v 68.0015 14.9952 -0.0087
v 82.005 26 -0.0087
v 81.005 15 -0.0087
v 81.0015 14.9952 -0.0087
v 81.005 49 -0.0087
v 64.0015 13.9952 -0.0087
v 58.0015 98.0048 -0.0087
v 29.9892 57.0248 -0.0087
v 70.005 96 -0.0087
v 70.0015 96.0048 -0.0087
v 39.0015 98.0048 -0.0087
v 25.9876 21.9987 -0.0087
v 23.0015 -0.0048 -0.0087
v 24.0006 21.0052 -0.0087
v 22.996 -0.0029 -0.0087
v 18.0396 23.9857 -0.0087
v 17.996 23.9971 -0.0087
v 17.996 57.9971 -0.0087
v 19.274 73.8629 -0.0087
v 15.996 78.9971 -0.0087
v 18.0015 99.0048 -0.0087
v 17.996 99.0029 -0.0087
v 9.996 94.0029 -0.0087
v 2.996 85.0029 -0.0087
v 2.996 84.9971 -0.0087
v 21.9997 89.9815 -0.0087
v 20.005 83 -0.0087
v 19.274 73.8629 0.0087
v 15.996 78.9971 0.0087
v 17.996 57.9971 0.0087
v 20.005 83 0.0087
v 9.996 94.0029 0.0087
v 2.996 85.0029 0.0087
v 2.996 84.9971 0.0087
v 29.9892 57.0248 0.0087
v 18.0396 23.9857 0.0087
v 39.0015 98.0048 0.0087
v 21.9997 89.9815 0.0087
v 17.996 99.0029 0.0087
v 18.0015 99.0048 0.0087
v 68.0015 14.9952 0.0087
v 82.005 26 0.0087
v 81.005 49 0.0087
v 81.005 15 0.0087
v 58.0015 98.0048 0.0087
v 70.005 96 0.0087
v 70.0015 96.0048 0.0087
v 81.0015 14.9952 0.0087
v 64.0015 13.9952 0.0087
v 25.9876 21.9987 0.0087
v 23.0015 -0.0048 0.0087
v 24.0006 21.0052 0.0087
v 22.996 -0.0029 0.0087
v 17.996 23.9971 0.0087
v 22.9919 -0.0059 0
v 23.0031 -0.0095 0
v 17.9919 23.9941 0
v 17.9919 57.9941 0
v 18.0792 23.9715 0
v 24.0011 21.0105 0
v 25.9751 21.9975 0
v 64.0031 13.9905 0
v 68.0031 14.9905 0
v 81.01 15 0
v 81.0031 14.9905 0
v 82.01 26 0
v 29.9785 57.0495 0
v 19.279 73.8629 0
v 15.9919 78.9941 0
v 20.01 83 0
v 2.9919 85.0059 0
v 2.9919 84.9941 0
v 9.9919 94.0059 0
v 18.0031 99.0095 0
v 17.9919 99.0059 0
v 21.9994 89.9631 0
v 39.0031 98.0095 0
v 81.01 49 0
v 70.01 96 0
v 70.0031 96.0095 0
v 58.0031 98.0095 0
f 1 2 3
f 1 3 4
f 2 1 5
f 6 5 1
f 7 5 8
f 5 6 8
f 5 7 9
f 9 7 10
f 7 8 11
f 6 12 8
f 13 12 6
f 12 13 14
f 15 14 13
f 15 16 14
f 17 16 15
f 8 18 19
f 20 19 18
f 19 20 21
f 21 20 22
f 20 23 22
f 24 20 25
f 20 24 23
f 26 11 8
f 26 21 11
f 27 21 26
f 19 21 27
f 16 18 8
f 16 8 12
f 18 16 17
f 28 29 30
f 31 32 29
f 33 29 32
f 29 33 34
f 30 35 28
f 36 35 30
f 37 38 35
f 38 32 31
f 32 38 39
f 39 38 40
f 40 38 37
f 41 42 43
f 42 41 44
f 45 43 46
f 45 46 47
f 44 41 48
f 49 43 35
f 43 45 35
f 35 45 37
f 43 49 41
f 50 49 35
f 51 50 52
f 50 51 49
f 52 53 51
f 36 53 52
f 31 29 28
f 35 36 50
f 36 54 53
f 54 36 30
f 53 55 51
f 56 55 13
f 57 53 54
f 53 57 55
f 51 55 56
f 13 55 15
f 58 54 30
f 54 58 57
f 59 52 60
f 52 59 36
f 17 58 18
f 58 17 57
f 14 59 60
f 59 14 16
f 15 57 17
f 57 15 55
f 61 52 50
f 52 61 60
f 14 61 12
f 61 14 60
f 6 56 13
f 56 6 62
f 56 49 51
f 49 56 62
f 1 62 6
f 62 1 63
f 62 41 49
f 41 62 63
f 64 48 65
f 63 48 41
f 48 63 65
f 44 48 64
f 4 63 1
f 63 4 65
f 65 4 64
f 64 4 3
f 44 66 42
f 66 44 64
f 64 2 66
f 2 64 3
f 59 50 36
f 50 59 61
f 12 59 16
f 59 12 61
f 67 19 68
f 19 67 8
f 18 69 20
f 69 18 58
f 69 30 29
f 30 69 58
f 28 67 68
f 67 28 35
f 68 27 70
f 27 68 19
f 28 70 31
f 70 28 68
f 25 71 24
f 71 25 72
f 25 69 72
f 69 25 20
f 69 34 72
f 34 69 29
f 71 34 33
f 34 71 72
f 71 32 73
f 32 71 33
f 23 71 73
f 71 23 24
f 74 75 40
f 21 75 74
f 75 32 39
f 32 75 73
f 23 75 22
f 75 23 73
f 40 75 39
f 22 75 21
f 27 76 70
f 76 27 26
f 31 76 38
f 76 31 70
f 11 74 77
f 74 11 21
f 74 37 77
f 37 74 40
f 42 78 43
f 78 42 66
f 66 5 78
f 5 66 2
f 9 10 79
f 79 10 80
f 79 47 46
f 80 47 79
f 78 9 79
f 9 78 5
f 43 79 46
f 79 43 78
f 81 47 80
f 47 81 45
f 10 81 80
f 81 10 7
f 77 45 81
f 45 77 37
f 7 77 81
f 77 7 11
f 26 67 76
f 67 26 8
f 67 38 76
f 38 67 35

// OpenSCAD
color([0.38512246522478266,0.6162859510128613,0.407224705538046]) hull(){
    translate([42,29]) sphere(0.01);
    translate([44,47]) sphere(0.01);
    translate([35,48]) sphere(0.01);
}
color([0.6107800780239486,0.9541913078580654,0.09369719926319908]) hull(){
    translate([42,29]) sphere(0.01);
    translate([44,47]) sphere(0.01);
    translate([58,33]) sphere(0.01);
}
color([0.4396226851829427,0.9817497074141792,0.30111933510979894]) hull(){
    translate([44,47]) sphere(0.01);
    translate([35,48]) sphere(0.01);
    translate([44,55]) sphere(0.01);
}
color([0.08571041628526821,0.691130580335744,0.16573157374072334]) hull(){
    translate([44,47]) sphere(0.01);
    translate([44,55]) sphere(0.01);
    translate([58,33]) sphere(0.01);
}
color([0.4668304924867862,0.30100213617539295,0.3511677492745029]) hull(){
    translate([23,0]) sphere(0.01);
    translate([18,24]) sphere(0.01);
    translate([24,21]) sphere(0.01);
}
color([0.05564944269037686,0.7696481469448815,0.686275624239137]) hull(){
    translate([23,0]) sphere(0.01);
    translate([24,21]) sphere(0.01);
    translate([26,22]) sphere(0.01);
}
color([0.15447252119296884,0.35335085758162643,0.18799175914388588]) hull(){
    translate([23,0]) sphere(0.01);
    translate([26,22]) sphere(0.01);
    translate([42,29]) sphere(0.01);
}
color([0.41322879780265653,0.82270842281296,0.9057146612667819]) hull(){
    translate([23,0]) sphere(0.01);
    translate([42,29]) sphere(0.01);
    translate([64,14]) sphere(0.01);
}
color([0.9688547633127277,0.5528378273263655,0.12760284187612392]) hull(){
    translate([64,14]) sphere(0.01);
    translate([42,29]) sphere(0.01);
    translate([58,33]) sphere(0.01);
}
color([0.1710979555253146,0.7131998843266452,0.6397779425125977]) hull(){
    translate([64,14]) sphere(0.01);
    translate([58,33]) sphere(0.01);
    translate([68,15]) sphere(0.01);
}
color([0.57496968906483,0.8489371230716904,0.07944838941339594]) hull(){
    translate([68,15]) sphere(0.01);
    translate([58,33]) sphere(0.01);
    translate([72,20]) sphere(0.01);
}
color([0.040333123224873146,0.9305910632054132,0.3080440975445232]) hull(){
    translate([68,15]) sphere(0.01);
    translate([72,20]) sphere(0.01);
    translate([81,15]) sphere(0.01);
}
color([0.6084655882345898,0.4923441190446234,0.7069385087242315]) hull(){
    translate([81,15]) sphere(0.01);
    translate([72,20]) sphere(0.01);
    translate([82,26]) sphere(0.01);
}
color([0.6803385961846494,0.18024793645131376,0.10787678186317007]) hull(){
    translate([18,24]) sphere(0.01);
    translate([26,22]) sphere(0.01);
    translate([26,51]) sphere(0.01);
}
color([0.1335624130282893,0.47731112778056706,0.8393950916733898]) hull(){
    translate([26,22]) sphere(0.01);
    translate([26,51]) sphere(0.01);
    translate([35,48]) sphere(0.01);
}
color([0.6780893207968227,0.08337096158279222,0.27725115680544954]) hull(){
    translate([26,22]) sphere(0.01);
    translate([35,48]) sphere(0.01);
    translate([42,29]) sphere(0.01);
}
color([0.9965791662073833,0.03375154870506614,0.10494976972159242]) hull(){
    translate([26,51]) sphere(0.01);
    translate([35,48]) sphere(0.01);
    translate([30,57]) sphere(0.01);
}
color([0.516844917539197,0.1360610465034362,0.543805910213663]) hull(){
    translate([26,51]) sphere(0.01);
    translate([30,57]) sphere(0.01);
    translate([18,58]) sphere(0.01);
}
color([0.04901628196141694,0.4867102513994055,0.8813892002857401]) hull(){
    translate([18,24]) sphere(0.01);
    translate([26,51]) sphere(0.01);
    translate([18,58]) sphere(0.01);
}
color([0.3053751014353143,0.40772022041766365,0.31297204198076634]) hull(){
    translate([35,48]) sphere(0.01);
    translate([30,57]) sphere(0.01);
    translate([44,55]) sphere(0.01);
}
color([0.49907796034366436,0.6160709555012981,0.9916538905911245]) hull(){
    translate([44,55]) sphere(0.01);
    translate([30,57]) sphere(0.01);
    translate([59,71]) sphere(0.01);
}
color([0.3123575451593331,0.46364206475662195,0.8862899719975306]) hull(){
    translate([30,57]) sphere(0.01);
    translate([18,58]) sphere(0.01);
    translate([16,79]) sphere(0.01);
}
color([0.5738800220993816,0.8494037217359881,0.24323676398212035]) hull(){
    translate([44,55]) sphere(0.01);
    translate([59,71]) sphere(0.01);
    translate([77,50]) sphere(0.01);
}
color([0.8402878098664139,0.9530478541805099,0.16594803365564914]) hull(){
    translate([18,58]) sphere(0.01);
    translate([16,79]) sphere(0.01);
    translate([20,83]) sphere(0.01);
}
color([0.0023370868964924796,0.7387895340607371,0.5374530602666081]) hull(){
    translate([20,83]) sphere(0.01);
    translate([16,79]) sphere(0.01);
    translate([6,84]) sphere(0.01);
}
color([0.25604025835089217,0.4320068924153808,0.5112453323210508]) hull(){
    translate([16,79]) sphere(0.01);
    translate([6,84]) sphere(0.01);
    translate([3,85]) sphere(0.01);
}
color([0.7462272619347637,0.5039790716190428,0.8850839351693509]) hull(){
    translate([20,83]) sphere(0.01);
    translate([6,84]) sphere(0.01);
    translate([10,94]) sphere(0.01);
}
color([0.6652757233710683,0.22263754843686523,0.08942086350367451]) hull(){
    translate([10,94]) sphere(0.01);
    translate([6,84]) sphere(0.01);
    translate([3,85]) sphere(0.01);
}
color([0.6195232841458308,0.9036720387350747,0.7222923954673625]) hull(){
    translate([10,94]) sphere(0.01);
    translate([3,85]) sphere(0.01);
    translate([18,99]) sphere(0.01);
}
color([0.6665075097113882,0.5421139713900744,0.6943978877819516]) hull(){
    translate([20,83]) sphere(0.01);
    translate([10,94]) sphere(0.01);
    translate([22,90]) sphere(0.01);
}
color([0.9269770591996176,0.12480324665016229,0.8422397758241813]) hull(){
    translate([22,90]) sphere(0.01);
    translate([10,94]) sphere(0.01);
    translate([18,99]) sphere(0.01);
}
color([0.028249143050612435,0.8554899328562455,0.6212809598996976]) hull(){
    translate([22,90]) sphere(0.01);
    translate([18,99]) sphere(0.01);
    translate([39,98]) sphere(0.01);
}
color([0.6435486749275994,0.4857227915978113,0.2898251547629681]) hull(){
    translate([22,90]) sphere(0.01);
    translate([39,98]) sphere(0.01);
    translate([50,93]) sphere(0.01);
}
color([0.21709076393122206,0.4979948584580751,0.6176241526046676]) hull(){
    translate([58,33]) sphere(0.01);
    translate([72,20]) sphere(0.01);
    translate([82,26]) sphere(0.01);
}
color([0.4722249532281336,0.7228331534363125,0.6109414561657331]) hull(){
    translate([58,33]) sphere(0.01);
    translate([82,26]) sphere(0.01);
    translate([80,52]) sphere(0.01);
}
color([0.5330085163671737,0.6769359871291822,0.5973748769978083]) hull(){
    translate([82,26]) sphere(0.01);
    translate([80,52]) sphere(0.01);
    translate([81,49]) sphere(0.01);
}
color([0.14460255854654236,0.21273280877313017,0.8417179364881341]) hull(){
    translate([80,52]) sphere(0.01);
    translate([77,50]) sphere(0.01);
    translate([81,49]) sphere(0.01);
}
color([0.6300391880279899,0.5103677782275869,0.4479627161837708]) hull(){
    translate([58,33]) sphere(0.01);
    translate([80,52]) sphere(0.01);
    translate([77,50]) sphere(0.01);
}
color([0.2903518628620462,0.1744676713524972,0.5457372127765215]) hull(){
    translate([44,47]) sphere(0.01);
    translate([58,33]) sphere(0.01);
    translate([77,50]) sphere(0.01);
}
color([0.6340658375422632,0.7004271366493812,0.690956934786038]) hull(){
    translate([44,47]) sphere(0.01);
    translate([77,50]) sphere(0.01);
    translate([44,55]) sphere(0.01);
}
color([0.013948469234104865,0.8018456354370093,0.2607079205191076]) hull(){
    translate([59,71]) sphere(0.01);
    translate([77,50]) sphere(0.01);
    translate([80,52]) sphere(0.01);
}
color([0.01899716010339858,0.7507132946374245,0.44168653561511173]) hull(){
    translate([59,71]) sphere(0.01);
    translate([80,52]) sphere(0.01);
    translate([70,96]) sphere(0.01);
}
color([0.1668653701245908,0.45955837321901094,0.7876756969907556]) hull(){
    translate([80,52]) sphere(0.01);
    translate([70,96]) sphere(0.01);
    translate([81,49]) sphere(0.01);
}
color([0.09564527702692727,0.06733136152719421,0.7816649665975636]) hull(){
    translate([59,71]) sphere(0.01);
    translate([70,96]) sphere(0.01);
    translate([50,93]) sphere(0.01);
}
color([0.030385075649315252,0.33346286891595733,0.08647112242809318]) hull(){
    translate([50,93]) sphere(0.01);
    translate([70,96]) sphere(0.01);
    translate([58,98]) sphere(0.01);
}
color([0.8161439782233904,0.05657658467482607,0.8243668117903717]) hull(){
    translate([50,93]) sphere(0.01);
    translate([58,98]) sphere(0.01);
    translate([39,98]) sphere(0.01);
}
color([0.05808931884644186,0.6181904095369413,0.1426995958976538]) hull(){
    translate([59,71]) sphere(0.01);
    translate([50,93]) sphere(0.01);
    translate([22,90]) sphere(0.01);
}
color([0.3846464495954227,0.3794414211645075,0.7643773332264734]) hull(){
    translate([59,71]) sphere(0.01);
    translate([22,90]) sphere(0.01);
    translate([30,57]) sphere(0.01);
}
